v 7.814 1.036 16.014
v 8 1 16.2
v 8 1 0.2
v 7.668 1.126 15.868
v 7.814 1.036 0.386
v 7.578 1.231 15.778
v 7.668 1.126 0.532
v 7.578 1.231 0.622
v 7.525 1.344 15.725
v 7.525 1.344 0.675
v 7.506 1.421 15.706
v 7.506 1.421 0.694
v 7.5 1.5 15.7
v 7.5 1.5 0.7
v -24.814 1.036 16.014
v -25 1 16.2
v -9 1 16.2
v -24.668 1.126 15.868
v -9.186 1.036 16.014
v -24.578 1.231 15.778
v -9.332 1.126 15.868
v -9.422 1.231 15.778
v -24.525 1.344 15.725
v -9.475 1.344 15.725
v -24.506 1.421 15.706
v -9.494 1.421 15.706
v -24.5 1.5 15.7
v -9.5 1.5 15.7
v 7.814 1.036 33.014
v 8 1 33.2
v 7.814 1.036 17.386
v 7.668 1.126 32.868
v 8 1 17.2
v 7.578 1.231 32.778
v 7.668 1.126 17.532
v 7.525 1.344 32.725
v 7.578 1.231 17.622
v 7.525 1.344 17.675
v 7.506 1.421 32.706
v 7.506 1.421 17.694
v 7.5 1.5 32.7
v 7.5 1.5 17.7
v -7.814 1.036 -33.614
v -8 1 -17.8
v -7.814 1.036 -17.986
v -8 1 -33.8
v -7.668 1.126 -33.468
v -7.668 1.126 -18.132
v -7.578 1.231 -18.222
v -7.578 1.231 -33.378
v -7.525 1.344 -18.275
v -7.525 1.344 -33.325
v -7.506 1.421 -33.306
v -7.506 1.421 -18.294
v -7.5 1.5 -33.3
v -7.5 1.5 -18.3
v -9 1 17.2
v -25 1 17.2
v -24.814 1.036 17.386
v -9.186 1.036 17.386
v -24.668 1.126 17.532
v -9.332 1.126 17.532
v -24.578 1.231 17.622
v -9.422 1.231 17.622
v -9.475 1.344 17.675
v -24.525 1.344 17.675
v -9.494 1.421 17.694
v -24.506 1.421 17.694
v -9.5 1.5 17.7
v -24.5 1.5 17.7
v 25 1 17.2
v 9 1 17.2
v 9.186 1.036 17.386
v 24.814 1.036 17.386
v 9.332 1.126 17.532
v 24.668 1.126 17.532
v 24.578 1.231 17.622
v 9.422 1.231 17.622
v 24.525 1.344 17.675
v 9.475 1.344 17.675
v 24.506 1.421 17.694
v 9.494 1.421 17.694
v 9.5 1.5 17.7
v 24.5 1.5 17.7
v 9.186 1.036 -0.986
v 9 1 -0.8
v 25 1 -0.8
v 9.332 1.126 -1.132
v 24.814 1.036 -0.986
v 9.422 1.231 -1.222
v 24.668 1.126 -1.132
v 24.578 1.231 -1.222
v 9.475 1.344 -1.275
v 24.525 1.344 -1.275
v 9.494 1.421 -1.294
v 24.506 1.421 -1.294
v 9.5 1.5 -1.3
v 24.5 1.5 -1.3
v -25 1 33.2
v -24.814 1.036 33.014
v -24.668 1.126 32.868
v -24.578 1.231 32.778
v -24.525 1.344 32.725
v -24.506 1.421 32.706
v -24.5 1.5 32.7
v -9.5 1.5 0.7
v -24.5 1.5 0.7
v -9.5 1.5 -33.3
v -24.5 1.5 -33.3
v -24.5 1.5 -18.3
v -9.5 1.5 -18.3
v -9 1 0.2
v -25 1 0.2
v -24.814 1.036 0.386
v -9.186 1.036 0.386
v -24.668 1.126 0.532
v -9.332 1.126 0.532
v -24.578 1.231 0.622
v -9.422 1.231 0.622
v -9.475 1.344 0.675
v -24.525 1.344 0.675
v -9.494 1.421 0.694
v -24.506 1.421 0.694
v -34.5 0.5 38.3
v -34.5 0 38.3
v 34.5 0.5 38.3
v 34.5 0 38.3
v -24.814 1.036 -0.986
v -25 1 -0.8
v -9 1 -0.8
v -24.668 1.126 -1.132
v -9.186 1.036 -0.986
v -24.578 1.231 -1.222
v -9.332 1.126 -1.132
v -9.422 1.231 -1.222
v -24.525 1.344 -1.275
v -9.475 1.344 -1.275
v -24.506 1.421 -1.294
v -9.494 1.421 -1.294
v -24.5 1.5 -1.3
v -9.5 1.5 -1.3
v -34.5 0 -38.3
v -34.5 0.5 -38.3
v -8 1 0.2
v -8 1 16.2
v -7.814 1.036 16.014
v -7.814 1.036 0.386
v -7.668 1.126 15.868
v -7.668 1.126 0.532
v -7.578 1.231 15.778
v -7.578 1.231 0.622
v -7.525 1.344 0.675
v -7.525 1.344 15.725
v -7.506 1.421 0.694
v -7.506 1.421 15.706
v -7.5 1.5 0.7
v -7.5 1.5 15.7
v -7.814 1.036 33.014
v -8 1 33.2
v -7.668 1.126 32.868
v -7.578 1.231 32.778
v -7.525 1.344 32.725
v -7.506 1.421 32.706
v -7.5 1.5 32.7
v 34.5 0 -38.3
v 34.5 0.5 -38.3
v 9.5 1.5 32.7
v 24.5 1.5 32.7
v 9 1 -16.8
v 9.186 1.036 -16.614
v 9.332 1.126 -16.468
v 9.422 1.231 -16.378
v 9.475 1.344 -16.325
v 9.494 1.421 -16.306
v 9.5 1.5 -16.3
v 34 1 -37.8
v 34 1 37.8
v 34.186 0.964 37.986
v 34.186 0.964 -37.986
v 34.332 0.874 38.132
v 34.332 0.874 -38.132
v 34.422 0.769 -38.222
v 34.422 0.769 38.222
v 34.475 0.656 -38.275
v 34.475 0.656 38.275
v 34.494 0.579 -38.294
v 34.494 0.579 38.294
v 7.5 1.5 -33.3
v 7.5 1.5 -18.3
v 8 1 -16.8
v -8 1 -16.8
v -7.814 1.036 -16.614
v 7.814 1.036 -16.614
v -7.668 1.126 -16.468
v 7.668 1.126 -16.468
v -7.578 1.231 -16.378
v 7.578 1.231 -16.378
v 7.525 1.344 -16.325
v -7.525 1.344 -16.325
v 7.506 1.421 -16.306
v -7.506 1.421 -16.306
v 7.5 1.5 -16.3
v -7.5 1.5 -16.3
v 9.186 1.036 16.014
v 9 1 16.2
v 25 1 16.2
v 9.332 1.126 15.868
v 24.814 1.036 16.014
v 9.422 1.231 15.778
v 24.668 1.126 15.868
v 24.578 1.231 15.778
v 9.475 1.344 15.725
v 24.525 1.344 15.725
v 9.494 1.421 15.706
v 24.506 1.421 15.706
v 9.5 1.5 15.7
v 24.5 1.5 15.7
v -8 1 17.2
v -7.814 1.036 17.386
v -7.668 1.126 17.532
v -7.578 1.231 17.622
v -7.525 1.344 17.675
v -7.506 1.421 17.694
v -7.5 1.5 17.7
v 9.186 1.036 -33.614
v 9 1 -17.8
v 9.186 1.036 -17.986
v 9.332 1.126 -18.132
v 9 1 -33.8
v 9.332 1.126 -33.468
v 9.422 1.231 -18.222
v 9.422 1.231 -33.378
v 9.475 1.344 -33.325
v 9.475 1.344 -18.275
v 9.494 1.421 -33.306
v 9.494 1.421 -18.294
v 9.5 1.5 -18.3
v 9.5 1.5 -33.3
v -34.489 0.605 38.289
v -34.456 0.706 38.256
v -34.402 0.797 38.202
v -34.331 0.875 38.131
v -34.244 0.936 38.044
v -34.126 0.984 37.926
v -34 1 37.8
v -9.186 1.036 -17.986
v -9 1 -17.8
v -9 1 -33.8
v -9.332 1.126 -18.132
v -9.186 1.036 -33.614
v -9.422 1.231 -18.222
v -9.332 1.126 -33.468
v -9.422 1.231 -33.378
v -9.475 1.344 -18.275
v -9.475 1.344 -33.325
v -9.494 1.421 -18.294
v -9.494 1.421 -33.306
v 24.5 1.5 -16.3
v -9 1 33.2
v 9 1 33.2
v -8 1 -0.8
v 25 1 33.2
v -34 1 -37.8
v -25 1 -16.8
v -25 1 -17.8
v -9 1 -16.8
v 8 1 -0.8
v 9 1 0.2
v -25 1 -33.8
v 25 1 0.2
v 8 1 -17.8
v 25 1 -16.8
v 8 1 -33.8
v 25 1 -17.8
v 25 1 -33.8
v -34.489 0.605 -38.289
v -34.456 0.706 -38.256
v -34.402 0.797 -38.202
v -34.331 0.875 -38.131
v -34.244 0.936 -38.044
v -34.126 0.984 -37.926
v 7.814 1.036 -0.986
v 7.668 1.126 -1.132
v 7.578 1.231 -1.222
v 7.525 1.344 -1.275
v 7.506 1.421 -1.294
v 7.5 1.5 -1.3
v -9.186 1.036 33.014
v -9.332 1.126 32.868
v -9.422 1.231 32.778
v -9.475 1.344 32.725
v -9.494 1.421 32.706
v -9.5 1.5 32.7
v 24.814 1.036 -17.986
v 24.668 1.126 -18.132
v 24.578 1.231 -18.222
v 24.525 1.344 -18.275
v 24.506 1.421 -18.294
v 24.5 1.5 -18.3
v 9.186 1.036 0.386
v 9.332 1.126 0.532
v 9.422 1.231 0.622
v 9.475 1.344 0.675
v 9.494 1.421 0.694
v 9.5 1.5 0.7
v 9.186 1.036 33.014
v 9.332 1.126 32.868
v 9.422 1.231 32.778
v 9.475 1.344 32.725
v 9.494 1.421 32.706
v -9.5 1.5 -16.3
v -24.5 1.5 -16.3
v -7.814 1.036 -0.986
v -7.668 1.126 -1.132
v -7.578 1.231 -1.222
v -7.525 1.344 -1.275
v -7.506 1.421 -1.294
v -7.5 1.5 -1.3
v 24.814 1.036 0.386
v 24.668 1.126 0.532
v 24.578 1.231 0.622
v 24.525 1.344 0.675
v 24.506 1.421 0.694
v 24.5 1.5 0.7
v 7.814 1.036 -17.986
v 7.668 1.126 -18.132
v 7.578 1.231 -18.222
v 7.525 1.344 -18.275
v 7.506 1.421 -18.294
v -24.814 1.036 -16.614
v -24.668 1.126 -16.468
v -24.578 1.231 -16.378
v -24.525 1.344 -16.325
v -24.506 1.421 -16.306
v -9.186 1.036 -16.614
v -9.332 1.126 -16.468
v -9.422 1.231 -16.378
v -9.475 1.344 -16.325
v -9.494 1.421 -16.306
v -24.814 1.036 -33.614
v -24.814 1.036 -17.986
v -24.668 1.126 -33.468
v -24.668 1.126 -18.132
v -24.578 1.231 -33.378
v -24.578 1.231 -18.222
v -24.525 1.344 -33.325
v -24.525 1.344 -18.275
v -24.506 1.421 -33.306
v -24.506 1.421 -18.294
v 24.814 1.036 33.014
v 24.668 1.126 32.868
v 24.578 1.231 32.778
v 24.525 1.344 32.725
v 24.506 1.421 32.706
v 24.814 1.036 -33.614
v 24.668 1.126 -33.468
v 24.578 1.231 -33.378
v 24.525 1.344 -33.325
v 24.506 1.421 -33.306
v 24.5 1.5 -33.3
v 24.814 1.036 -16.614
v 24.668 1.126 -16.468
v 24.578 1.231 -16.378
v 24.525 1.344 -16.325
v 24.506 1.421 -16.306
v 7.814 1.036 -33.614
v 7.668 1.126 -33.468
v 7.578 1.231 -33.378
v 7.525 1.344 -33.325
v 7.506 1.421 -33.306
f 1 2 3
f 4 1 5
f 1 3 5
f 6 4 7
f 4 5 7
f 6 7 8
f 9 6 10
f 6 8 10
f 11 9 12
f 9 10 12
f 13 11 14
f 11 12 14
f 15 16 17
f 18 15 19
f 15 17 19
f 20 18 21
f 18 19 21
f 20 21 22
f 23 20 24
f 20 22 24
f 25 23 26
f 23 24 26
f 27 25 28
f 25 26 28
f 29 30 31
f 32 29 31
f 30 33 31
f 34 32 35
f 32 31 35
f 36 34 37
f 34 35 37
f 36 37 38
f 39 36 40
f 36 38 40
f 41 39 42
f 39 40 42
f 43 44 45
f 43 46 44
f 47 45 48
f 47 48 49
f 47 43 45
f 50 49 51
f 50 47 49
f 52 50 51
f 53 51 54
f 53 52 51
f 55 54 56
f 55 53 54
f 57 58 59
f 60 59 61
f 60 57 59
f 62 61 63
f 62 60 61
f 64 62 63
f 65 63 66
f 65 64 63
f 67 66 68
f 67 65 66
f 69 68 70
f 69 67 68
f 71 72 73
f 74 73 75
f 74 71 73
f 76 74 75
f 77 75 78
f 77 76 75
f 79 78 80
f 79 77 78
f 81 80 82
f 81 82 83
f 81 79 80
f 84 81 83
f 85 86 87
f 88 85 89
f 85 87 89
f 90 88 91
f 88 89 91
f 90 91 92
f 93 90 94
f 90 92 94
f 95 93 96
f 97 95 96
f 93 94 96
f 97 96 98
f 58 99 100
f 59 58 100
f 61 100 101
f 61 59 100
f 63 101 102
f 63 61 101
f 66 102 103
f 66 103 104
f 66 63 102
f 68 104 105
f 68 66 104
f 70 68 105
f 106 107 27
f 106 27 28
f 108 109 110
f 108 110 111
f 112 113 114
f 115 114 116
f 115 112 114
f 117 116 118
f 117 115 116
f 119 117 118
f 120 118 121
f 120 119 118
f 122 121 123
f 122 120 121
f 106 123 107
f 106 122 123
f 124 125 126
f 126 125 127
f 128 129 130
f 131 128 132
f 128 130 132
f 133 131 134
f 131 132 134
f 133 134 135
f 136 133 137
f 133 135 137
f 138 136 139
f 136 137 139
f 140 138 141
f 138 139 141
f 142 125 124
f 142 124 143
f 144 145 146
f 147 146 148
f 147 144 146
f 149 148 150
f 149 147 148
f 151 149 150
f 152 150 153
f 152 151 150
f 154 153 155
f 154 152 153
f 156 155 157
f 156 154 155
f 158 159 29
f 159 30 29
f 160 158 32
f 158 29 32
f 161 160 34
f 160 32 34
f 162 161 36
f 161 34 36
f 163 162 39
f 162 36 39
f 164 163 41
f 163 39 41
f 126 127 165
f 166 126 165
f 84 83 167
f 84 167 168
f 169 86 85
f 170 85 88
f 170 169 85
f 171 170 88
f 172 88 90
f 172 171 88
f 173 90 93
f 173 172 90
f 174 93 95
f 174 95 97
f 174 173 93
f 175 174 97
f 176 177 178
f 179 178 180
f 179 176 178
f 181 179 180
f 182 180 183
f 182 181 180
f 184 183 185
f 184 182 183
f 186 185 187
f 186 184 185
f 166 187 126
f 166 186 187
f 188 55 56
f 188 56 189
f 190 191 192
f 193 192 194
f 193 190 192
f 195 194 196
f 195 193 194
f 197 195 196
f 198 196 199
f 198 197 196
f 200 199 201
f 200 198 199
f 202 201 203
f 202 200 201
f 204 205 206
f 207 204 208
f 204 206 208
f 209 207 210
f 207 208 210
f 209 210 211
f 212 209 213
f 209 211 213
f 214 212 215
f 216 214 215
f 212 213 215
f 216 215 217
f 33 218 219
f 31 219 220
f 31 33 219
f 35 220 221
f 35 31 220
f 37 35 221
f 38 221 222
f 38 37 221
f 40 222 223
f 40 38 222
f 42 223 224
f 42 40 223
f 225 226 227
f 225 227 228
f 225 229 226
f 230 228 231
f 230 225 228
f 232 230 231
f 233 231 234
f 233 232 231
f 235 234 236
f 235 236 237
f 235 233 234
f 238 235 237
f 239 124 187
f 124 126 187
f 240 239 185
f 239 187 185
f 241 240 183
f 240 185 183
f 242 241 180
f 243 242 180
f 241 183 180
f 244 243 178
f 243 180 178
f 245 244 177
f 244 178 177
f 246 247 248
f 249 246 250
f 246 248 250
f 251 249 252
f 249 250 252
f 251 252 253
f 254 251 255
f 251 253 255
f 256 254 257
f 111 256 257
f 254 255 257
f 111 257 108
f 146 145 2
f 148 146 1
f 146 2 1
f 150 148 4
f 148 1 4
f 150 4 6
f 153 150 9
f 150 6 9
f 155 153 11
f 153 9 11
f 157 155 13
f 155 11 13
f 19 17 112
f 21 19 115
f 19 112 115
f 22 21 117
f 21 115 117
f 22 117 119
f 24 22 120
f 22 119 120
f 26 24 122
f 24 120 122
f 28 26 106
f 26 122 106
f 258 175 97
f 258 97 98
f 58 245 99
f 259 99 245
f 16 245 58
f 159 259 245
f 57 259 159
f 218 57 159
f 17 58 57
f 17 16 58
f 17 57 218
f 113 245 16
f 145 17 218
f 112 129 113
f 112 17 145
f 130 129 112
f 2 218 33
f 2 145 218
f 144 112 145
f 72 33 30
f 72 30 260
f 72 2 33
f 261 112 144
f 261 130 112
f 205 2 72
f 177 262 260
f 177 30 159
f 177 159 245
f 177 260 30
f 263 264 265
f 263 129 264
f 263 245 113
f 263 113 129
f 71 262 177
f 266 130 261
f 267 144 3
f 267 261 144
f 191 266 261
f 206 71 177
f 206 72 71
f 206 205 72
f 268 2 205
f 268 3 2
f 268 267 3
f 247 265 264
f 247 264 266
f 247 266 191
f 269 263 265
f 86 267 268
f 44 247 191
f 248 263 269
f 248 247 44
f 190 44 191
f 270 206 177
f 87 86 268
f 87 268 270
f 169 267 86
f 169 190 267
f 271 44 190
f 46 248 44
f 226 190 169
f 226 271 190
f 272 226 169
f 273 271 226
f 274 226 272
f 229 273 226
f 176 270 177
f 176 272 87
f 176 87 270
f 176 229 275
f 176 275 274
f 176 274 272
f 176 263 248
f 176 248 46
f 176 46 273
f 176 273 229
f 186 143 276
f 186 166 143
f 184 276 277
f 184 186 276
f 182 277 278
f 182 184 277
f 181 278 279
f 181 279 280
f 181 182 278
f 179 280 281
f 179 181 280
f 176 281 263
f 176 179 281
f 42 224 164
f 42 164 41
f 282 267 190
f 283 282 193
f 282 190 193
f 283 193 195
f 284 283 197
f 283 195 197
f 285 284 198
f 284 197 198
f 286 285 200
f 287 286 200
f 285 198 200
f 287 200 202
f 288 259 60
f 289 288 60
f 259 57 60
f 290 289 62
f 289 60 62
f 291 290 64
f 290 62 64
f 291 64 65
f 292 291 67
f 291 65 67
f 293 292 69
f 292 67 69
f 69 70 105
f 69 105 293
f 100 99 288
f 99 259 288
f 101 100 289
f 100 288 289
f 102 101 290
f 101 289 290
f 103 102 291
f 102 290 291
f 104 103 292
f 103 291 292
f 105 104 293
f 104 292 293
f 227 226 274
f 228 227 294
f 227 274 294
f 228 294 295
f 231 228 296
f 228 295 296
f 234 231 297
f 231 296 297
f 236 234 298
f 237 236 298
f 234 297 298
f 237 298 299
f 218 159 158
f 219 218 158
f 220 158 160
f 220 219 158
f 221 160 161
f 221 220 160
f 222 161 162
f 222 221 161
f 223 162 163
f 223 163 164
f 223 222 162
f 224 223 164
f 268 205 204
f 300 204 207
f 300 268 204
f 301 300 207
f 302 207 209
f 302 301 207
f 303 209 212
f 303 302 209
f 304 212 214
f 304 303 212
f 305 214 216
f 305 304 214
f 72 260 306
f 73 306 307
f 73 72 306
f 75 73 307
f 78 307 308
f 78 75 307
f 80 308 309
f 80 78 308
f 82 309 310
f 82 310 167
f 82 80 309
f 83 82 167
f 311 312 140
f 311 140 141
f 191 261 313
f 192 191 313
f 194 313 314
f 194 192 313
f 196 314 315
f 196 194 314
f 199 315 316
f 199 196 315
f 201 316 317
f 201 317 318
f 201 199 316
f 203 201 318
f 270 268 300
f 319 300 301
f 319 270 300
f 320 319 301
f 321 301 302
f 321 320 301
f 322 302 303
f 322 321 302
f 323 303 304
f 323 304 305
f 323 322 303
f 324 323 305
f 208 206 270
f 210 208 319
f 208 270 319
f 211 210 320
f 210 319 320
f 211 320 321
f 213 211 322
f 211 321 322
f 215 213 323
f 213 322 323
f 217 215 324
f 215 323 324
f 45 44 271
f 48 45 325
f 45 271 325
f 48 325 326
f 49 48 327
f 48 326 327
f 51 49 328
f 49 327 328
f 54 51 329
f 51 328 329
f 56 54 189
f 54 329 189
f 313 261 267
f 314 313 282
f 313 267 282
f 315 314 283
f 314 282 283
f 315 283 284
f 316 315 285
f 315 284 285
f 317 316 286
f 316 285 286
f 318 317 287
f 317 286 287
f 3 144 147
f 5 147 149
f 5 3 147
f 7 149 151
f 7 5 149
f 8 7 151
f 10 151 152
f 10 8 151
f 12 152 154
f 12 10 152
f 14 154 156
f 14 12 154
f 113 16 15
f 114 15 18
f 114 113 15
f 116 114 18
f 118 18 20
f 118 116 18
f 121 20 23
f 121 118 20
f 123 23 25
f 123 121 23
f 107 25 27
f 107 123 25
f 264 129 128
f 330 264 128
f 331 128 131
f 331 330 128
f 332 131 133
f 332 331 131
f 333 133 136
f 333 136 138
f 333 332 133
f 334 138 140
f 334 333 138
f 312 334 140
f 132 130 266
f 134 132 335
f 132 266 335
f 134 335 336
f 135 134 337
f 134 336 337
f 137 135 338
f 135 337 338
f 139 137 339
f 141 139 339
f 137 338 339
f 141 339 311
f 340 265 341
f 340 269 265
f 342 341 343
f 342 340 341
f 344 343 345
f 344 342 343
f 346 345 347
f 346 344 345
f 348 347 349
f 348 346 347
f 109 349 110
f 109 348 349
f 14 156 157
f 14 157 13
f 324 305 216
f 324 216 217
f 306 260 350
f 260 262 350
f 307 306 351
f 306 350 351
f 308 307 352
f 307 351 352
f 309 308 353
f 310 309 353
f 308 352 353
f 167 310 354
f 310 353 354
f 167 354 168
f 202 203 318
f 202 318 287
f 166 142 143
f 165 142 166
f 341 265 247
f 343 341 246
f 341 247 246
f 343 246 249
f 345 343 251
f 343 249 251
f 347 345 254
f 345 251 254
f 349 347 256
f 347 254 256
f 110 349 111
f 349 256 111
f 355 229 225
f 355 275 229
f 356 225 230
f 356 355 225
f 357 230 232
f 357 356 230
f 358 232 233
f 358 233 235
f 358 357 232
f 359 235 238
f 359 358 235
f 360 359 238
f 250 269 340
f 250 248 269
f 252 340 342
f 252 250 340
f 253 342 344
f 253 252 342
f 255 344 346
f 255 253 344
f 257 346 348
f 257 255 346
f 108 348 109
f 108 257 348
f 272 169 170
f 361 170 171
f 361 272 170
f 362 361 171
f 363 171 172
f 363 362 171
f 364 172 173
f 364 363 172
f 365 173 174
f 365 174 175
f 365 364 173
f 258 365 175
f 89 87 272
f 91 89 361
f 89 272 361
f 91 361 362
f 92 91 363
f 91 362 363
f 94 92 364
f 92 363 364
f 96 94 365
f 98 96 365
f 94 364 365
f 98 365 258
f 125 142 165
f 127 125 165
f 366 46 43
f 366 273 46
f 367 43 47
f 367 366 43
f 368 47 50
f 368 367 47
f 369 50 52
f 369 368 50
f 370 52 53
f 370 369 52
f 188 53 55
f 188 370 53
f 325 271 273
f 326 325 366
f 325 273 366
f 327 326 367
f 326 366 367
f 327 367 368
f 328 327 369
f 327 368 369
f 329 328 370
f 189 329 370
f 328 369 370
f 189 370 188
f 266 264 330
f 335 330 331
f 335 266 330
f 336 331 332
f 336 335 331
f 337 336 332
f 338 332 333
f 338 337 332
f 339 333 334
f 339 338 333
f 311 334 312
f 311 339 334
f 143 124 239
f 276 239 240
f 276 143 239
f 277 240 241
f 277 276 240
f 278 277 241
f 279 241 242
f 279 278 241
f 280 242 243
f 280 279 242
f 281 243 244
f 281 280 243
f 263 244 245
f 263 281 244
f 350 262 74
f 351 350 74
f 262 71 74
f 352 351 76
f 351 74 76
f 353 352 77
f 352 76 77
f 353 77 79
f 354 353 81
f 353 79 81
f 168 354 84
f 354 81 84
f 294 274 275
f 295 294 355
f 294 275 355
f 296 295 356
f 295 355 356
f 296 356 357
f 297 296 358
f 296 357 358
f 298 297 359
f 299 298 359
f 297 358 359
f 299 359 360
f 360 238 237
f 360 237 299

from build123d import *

# Parameters (mm, degrees)
SKETCH1_W           = 69
SKETCH1_H           = 76.6
BOSS_EXTRUDE1_DEPTH = 1
SKETCH2_W           = 15
SKETCH2_H           = 15
BOSS_EXTRUDE2_DEPTH = 0.5
FILLET1_R           = 0.5


with BuildPart() as part:
    # Sketch1 → Boss-Extrude1 (new body)
    with BuildSketch(Plane(origin=(0, 0, 0), x_dir=(1, 0, 0), z_dir=(0, 1, 0))):
        Rectangle(SKETCH1_W, SKETCH1_H)
    extrude(amount=BOSS_EXTRUDE1_DEPTH)

    # Sketch2 → Boss-Extrude2 (add)
    with BuildSketch(Plane(origin=(0, 1, 0), x_dir=(1, 0, 0), z_dir=(0, 1, 0))):
        with Locations((-17, 8.8)):
            Rectangle(SKETCH2_W, SKETCH2_H)
        with Locations((-17, 25.8)):
            Rectangle(SKETCH2_W, SKETCH2_H)
        with Locations((0, 25.8)):
            Rectangle(SKETCH2_W, SKETCH2_H)
        with Locations((17, 25.8)):
            Rectangle(SKETCH2_W, SKETCH2_H)
        with Locations((0, 8.8)):
            Rectangle(SKETCH2_W, SKETCH2_H)
        with Locations((17, 8.8)):
            Rectangle(SKETCH2_W, SKETCH2_H)
        with Locations((-17, -8.2)):
            Rectangle(SKETCH2_W, SKETCH2_H)
        with Locations((0, -8.2)):
            Rectangle(SKETCH2_W, SKETCH2_H)
        with Locations((17, -8.2)):
            Rectangle(SKETCH2_W, SKETCH2_H)
        with Locations((-17, -25.2)):
            Rectangle(SKETCH2_W, SKETCH2_H)
        with Locations((0, -25.2)):
            Rectangle(SKETCH2_W, SKETCH2_H)
        with Locations((17, -25.2)):
            Rectangle(SKETCH2_W, SKETCH2_H)
    extrude(amount=BOSS_EXTRUDE2_DEPTH)

    # Fillet1
    fillet1_edges = [part.edges().sort_by_distance(p)[0] for p in [
        (17, 1, 32.7),
        (24.5, 1, 25.2),
        (17, 1, 17.7),
        (9.5, 1, 25.2),
        (-17, 1, 32.7),
        (-9.5, 1, 25.2),
        (-17, 1, 17.7),
        (-24.5, 1, 25.2),
        (0, 1, 15.7),
        (7.5, 1, 8.2),
        (0, 1, 0.7),
        (-7.5, 1, 8.2),
        (17, 1, -1.3),
        (24.5, 1, -8.8),
        (17, 1, -16.3),
        (9.5, 1, -8.8),
        (-17, 1, -1.3),
        (-9.5, 1, -8.8),
        (-17, 1, -16.3),
        (-24.5, 1, -8.8),
        (0, 1, -18.3),
        (7.5, 1, -25.8),
        (0, 1, -33.3),
        (-7.5, 1, -25.8),
        (34.5, 1, 0),
        (0, 1, 38.3),
        (-34.5, 1, 0),
        (0, 1, -38.3),
        (-17, 1, -18.3),
        (-9.5, 1, -25.8),
        (-17, 1, -33.3),
        (-24.5, 1, -25.8),
        (17, 1, -18.3),
        (24.5, 1, -25.8),
        (17, 1, -33.3),
        (9.5, 1, -25.8),
        (0, 1, -1.3),
        (7.5, 1, -8.8),
        (0, 1, -16.3),
        (-7.5, 1, -8.8),
        (-17, 1, 15.7),
        (-9.5, 1, 8.2),
        (-17, 1, 0.7),
        (-24.5, 1, 8.2),
        (17, 1, 15.7),
        (24.5, 1, 8.2),
        (17, 1, 0.7),
        (9.5, 1, 8.2),
        (0, 1, 32.7),
        (7.5, 1, 25.2),
        (0, 1, 17.7),
        (-7.5, 1, 25.2),
    ]]
    fillet(fillet1_edges, radius=FILLET1_R - 0.0001)  # a hair under: the kernel refuses the full size


solid = part.part
